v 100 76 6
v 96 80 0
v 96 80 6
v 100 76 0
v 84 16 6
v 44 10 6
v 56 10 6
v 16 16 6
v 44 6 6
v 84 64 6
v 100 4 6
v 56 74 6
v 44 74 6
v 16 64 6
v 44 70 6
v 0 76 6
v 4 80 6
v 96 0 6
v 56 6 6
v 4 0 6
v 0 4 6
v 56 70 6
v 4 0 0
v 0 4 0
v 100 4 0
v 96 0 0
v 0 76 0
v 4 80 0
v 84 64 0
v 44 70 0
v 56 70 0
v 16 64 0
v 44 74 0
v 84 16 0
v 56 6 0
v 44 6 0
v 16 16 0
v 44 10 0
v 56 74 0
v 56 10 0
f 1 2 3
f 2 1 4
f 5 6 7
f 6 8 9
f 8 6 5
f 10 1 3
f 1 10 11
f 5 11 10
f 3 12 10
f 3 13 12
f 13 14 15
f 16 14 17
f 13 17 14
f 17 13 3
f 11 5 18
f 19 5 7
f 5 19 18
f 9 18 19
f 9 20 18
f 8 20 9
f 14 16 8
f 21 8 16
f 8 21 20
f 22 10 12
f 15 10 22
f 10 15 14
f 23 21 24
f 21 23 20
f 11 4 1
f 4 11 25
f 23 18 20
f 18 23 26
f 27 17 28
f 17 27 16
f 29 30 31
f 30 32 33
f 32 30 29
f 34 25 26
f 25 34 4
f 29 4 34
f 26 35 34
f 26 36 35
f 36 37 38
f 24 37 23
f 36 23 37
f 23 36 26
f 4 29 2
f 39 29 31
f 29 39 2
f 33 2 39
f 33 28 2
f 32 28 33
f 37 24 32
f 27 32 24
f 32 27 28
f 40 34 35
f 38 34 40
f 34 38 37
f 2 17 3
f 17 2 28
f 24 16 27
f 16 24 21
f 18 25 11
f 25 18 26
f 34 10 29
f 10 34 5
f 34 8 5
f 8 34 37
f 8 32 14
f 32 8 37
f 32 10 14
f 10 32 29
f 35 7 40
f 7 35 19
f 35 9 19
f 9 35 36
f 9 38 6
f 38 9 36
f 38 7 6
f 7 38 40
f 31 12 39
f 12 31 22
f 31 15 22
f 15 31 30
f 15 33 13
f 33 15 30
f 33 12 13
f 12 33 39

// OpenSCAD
$fn = 32;

// ----------------------------------------------------------------------
// Frame plate: 100 x 80 frame, 16 mm rails
// ----------------------------------------------------------------------

// --- parameters (mm) ---
plate_l = 100;            // plate length, X
plate_w = 80;             // plate width, Y
plate_t = 6;              // plate thickness, Z (extrusion height)
corner_c = 4;             // corner chamfer
frame_bar = 16;           // frame rail width
slot_l = 12;              // adjustment slot length
slot_w = 4;               // adjustment slot width

win_l = plate_l - 2 * frame_bar;  // window length
win_w = plate_w - 2 * frame_bar;  // window width

profile = [[4, 0], [96, 0], [100, 4], [100, 76], [96, 80], [4, 80], [0, 76], [0, 4]];  // primary outline, 8 points, counter clockwise
void_1 = [[16, 16], [84, 16], [84, 64], [16, 64]];  // the window, 4 points
void_2 = [[44, 6], [56, 6], [56, 10], [44, 10]];  // adjustment slot, 4 points
void_3 = [[44, 70], [56, 70], [56, 74], [44, 74]];  // adjustment slot, 4 points

// --- the one profile operation ---
difference() {
  linear_extrude(height = plate_t) polygon(points = profile);
  translate([0, 0, -1])
    linear_extrude(height = plate_t + 2) polygon(points = void_1);
  translate([0, 0, -1])
    linear_extrude(height = plate_t + 2) polygon(points = void_2);
  translate([0, 0, -1])
    linear_extrude(height = plate_t + 2) polygon(points = void_3);
}
